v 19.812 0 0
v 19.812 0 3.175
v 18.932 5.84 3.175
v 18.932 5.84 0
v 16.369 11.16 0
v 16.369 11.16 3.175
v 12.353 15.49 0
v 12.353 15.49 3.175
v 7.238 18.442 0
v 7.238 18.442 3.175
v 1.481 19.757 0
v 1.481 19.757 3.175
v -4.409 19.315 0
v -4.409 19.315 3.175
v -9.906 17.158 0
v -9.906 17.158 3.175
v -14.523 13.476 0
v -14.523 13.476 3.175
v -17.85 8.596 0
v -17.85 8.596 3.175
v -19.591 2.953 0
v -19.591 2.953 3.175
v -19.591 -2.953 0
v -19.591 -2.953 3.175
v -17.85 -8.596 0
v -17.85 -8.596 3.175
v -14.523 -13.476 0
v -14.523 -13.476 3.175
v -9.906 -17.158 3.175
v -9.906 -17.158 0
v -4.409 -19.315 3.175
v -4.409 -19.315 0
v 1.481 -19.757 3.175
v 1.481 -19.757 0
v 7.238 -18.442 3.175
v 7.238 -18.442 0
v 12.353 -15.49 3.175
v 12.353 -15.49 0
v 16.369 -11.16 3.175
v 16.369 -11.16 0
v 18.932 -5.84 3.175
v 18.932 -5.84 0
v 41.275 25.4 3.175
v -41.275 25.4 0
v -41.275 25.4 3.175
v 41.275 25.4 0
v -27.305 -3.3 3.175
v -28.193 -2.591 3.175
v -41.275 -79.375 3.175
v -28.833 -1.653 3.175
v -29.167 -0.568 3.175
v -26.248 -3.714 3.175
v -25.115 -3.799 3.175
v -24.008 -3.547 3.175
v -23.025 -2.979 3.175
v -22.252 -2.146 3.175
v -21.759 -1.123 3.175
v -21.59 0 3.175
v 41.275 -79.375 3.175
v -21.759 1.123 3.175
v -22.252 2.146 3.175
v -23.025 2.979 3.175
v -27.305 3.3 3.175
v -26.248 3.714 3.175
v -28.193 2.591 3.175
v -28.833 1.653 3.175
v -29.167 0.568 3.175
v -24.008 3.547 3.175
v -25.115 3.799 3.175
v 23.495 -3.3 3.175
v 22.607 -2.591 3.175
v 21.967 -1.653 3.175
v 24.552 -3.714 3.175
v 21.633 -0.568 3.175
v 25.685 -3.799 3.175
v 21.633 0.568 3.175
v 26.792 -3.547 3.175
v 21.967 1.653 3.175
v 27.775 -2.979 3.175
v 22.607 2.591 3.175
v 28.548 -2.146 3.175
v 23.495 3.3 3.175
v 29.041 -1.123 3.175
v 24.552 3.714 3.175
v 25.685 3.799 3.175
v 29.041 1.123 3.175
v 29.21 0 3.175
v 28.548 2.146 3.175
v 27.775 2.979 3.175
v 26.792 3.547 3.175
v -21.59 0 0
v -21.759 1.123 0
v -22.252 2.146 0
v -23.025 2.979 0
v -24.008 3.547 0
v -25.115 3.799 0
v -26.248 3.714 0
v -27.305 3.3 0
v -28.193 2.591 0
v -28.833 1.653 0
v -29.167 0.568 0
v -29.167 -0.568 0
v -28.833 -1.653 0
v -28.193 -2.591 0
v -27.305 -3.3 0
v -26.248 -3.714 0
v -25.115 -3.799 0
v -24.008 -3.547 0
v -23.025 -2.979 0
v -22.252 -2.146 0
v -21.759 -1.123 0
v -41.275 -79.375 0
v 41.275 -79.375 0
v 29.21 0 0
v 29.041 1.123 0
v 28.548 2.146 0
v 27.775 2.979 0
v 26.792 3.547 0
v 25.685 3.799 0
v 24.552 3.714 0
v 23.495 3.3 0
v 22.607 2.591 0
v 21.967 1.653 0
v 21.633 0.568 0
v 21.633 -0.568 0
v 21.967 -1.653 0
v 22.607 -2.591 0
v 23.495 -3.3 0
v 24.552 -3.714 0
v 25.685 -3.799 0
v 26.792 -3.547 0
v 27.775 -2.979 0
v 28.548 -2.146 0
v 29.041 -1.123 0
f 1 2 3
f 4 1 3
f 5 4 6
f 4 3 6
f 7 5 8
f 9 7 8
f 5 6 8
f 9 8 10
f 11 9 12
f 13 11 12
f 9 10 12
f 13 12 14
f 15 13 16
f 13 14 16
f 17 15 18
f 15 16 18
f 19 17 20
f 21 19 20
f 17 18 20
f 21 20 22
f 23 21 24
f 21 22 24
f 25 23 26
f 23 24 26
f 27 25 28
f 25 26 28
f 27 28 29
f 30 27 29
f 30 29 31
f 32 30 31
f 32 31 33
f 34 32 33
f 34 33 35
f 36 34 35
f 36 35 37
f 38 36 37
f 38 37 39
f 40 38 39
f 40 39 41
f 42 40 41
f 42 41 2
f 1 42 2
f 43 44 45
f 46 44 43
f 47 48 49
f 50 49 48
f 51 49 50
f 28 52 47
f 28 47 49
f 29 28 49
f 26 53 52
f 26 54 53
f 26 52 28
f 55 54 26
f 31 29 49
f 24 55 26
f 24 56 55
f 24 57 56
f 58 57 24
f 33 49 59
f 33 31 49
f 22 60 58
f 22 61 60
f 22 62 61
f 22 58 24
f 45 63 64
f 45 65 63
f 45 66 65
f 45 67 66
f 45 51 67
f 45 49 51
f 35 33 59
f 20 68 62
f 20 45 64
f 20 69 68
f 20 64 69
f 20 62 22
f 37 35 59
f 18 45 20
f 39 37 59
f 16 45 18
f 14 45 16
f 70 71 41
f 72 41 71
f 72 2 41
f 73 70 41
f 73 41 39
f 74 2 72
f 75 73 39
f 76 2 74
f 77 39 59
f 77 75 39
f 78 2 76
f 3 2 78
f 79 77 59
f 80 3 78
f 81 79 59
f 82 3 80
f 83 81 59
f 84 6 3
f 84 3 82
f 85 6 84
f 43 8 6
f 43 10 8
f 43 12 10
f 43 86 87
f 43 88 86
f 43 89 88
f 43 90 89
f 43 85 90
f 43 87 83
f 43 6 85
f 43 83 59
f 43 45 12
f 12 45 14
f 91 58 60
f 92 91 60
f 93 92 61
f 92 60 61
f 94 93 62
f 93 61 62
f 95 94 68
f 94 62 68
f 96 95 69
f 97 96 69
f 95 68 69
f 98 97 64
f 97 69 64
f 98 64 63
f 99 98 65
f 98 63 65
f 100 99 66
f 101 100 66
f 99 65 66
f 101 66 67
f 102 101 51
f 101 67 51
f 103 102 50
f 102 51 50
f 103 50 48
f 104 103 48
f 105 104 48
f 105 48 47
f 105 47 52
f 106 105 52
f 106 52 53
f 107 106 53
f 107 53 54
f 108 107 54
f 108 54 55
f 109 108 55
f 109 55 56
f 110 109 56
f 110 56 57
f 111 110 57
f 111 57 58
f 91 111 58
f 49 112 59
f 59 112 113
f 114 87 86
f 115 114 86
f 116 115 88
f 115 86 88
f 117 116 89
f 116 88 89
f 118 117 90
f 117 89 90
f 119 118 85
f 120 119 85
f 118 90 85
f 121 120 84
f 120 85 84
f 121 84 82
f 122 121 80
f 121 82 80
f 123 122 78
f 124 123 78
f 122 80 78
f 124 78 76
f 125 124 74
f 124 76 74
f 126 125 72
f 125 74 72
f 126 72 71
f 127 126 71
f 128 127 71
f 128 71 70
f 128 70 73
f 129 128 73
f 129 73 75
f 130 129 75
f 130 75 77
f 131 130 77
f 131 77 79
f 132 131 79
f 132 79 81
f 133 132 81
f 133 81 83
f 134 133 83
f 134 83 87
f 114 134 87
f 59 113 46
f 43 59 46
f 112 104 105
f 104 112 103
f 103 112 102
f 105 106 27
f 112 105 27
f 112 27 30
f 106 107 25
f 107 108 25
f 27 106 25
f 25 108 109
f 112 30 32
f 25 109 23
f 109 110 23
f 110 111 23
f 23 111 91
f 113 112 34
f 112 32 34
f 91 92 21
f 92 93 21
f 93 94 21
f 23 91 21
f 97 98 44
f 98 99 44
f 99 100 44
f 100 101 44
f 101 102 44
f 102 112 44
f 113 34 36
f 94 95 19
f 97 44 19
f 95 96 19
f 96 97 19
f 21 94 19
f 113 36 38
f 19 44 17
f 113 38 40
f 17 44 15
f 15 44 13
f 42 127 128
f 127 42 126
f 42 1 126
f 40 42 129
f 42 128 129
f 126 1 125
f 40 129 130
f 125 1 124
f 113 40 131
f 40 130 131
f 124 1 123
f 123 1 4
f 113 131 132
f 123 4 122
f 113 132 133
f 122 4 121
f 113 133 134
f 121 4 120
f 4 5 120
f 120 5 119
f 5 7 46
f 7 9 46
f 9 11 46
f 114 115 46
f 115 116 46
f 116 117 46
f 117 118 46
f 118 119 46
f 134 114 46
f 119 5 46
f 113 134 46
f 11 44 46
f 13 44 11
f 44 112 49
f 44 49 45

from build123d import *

# Parameters (mm, degrees)
F0_W     = 82.55
F0_H     = 104.775
F1_DEPTH = 3.175
F2_R     = 19.812
F2_R_2   = 3.81
F3_DEPTH = 25.4


# Not quite as in the source:
# - a feature names something its author has since deleted; it is built from what else it names


with BuildPart() as f1:
    # F0 (on Top) → F1 (new body)
    with BuildSketch(Plane.XY):
        with Locations((0, -26.9875)):
            Rectangle(F0_W, F0_H)
    extrude(amount=F1_DEPTH)

    # F2 (on face) → F3 (cut)
    with BuildSketch(Plane.XY.offset(3.175)):
        Circle(F2_R)
        with Locations((-25.4, 0)):
            Circle(F2_R_2)
        with Locations((25.4, 0)):
            Circle(F2_R_2)
    extrude(amount=-F3_DEPTH, mode=Mode.SUBTRACT)


solid = f1.part
